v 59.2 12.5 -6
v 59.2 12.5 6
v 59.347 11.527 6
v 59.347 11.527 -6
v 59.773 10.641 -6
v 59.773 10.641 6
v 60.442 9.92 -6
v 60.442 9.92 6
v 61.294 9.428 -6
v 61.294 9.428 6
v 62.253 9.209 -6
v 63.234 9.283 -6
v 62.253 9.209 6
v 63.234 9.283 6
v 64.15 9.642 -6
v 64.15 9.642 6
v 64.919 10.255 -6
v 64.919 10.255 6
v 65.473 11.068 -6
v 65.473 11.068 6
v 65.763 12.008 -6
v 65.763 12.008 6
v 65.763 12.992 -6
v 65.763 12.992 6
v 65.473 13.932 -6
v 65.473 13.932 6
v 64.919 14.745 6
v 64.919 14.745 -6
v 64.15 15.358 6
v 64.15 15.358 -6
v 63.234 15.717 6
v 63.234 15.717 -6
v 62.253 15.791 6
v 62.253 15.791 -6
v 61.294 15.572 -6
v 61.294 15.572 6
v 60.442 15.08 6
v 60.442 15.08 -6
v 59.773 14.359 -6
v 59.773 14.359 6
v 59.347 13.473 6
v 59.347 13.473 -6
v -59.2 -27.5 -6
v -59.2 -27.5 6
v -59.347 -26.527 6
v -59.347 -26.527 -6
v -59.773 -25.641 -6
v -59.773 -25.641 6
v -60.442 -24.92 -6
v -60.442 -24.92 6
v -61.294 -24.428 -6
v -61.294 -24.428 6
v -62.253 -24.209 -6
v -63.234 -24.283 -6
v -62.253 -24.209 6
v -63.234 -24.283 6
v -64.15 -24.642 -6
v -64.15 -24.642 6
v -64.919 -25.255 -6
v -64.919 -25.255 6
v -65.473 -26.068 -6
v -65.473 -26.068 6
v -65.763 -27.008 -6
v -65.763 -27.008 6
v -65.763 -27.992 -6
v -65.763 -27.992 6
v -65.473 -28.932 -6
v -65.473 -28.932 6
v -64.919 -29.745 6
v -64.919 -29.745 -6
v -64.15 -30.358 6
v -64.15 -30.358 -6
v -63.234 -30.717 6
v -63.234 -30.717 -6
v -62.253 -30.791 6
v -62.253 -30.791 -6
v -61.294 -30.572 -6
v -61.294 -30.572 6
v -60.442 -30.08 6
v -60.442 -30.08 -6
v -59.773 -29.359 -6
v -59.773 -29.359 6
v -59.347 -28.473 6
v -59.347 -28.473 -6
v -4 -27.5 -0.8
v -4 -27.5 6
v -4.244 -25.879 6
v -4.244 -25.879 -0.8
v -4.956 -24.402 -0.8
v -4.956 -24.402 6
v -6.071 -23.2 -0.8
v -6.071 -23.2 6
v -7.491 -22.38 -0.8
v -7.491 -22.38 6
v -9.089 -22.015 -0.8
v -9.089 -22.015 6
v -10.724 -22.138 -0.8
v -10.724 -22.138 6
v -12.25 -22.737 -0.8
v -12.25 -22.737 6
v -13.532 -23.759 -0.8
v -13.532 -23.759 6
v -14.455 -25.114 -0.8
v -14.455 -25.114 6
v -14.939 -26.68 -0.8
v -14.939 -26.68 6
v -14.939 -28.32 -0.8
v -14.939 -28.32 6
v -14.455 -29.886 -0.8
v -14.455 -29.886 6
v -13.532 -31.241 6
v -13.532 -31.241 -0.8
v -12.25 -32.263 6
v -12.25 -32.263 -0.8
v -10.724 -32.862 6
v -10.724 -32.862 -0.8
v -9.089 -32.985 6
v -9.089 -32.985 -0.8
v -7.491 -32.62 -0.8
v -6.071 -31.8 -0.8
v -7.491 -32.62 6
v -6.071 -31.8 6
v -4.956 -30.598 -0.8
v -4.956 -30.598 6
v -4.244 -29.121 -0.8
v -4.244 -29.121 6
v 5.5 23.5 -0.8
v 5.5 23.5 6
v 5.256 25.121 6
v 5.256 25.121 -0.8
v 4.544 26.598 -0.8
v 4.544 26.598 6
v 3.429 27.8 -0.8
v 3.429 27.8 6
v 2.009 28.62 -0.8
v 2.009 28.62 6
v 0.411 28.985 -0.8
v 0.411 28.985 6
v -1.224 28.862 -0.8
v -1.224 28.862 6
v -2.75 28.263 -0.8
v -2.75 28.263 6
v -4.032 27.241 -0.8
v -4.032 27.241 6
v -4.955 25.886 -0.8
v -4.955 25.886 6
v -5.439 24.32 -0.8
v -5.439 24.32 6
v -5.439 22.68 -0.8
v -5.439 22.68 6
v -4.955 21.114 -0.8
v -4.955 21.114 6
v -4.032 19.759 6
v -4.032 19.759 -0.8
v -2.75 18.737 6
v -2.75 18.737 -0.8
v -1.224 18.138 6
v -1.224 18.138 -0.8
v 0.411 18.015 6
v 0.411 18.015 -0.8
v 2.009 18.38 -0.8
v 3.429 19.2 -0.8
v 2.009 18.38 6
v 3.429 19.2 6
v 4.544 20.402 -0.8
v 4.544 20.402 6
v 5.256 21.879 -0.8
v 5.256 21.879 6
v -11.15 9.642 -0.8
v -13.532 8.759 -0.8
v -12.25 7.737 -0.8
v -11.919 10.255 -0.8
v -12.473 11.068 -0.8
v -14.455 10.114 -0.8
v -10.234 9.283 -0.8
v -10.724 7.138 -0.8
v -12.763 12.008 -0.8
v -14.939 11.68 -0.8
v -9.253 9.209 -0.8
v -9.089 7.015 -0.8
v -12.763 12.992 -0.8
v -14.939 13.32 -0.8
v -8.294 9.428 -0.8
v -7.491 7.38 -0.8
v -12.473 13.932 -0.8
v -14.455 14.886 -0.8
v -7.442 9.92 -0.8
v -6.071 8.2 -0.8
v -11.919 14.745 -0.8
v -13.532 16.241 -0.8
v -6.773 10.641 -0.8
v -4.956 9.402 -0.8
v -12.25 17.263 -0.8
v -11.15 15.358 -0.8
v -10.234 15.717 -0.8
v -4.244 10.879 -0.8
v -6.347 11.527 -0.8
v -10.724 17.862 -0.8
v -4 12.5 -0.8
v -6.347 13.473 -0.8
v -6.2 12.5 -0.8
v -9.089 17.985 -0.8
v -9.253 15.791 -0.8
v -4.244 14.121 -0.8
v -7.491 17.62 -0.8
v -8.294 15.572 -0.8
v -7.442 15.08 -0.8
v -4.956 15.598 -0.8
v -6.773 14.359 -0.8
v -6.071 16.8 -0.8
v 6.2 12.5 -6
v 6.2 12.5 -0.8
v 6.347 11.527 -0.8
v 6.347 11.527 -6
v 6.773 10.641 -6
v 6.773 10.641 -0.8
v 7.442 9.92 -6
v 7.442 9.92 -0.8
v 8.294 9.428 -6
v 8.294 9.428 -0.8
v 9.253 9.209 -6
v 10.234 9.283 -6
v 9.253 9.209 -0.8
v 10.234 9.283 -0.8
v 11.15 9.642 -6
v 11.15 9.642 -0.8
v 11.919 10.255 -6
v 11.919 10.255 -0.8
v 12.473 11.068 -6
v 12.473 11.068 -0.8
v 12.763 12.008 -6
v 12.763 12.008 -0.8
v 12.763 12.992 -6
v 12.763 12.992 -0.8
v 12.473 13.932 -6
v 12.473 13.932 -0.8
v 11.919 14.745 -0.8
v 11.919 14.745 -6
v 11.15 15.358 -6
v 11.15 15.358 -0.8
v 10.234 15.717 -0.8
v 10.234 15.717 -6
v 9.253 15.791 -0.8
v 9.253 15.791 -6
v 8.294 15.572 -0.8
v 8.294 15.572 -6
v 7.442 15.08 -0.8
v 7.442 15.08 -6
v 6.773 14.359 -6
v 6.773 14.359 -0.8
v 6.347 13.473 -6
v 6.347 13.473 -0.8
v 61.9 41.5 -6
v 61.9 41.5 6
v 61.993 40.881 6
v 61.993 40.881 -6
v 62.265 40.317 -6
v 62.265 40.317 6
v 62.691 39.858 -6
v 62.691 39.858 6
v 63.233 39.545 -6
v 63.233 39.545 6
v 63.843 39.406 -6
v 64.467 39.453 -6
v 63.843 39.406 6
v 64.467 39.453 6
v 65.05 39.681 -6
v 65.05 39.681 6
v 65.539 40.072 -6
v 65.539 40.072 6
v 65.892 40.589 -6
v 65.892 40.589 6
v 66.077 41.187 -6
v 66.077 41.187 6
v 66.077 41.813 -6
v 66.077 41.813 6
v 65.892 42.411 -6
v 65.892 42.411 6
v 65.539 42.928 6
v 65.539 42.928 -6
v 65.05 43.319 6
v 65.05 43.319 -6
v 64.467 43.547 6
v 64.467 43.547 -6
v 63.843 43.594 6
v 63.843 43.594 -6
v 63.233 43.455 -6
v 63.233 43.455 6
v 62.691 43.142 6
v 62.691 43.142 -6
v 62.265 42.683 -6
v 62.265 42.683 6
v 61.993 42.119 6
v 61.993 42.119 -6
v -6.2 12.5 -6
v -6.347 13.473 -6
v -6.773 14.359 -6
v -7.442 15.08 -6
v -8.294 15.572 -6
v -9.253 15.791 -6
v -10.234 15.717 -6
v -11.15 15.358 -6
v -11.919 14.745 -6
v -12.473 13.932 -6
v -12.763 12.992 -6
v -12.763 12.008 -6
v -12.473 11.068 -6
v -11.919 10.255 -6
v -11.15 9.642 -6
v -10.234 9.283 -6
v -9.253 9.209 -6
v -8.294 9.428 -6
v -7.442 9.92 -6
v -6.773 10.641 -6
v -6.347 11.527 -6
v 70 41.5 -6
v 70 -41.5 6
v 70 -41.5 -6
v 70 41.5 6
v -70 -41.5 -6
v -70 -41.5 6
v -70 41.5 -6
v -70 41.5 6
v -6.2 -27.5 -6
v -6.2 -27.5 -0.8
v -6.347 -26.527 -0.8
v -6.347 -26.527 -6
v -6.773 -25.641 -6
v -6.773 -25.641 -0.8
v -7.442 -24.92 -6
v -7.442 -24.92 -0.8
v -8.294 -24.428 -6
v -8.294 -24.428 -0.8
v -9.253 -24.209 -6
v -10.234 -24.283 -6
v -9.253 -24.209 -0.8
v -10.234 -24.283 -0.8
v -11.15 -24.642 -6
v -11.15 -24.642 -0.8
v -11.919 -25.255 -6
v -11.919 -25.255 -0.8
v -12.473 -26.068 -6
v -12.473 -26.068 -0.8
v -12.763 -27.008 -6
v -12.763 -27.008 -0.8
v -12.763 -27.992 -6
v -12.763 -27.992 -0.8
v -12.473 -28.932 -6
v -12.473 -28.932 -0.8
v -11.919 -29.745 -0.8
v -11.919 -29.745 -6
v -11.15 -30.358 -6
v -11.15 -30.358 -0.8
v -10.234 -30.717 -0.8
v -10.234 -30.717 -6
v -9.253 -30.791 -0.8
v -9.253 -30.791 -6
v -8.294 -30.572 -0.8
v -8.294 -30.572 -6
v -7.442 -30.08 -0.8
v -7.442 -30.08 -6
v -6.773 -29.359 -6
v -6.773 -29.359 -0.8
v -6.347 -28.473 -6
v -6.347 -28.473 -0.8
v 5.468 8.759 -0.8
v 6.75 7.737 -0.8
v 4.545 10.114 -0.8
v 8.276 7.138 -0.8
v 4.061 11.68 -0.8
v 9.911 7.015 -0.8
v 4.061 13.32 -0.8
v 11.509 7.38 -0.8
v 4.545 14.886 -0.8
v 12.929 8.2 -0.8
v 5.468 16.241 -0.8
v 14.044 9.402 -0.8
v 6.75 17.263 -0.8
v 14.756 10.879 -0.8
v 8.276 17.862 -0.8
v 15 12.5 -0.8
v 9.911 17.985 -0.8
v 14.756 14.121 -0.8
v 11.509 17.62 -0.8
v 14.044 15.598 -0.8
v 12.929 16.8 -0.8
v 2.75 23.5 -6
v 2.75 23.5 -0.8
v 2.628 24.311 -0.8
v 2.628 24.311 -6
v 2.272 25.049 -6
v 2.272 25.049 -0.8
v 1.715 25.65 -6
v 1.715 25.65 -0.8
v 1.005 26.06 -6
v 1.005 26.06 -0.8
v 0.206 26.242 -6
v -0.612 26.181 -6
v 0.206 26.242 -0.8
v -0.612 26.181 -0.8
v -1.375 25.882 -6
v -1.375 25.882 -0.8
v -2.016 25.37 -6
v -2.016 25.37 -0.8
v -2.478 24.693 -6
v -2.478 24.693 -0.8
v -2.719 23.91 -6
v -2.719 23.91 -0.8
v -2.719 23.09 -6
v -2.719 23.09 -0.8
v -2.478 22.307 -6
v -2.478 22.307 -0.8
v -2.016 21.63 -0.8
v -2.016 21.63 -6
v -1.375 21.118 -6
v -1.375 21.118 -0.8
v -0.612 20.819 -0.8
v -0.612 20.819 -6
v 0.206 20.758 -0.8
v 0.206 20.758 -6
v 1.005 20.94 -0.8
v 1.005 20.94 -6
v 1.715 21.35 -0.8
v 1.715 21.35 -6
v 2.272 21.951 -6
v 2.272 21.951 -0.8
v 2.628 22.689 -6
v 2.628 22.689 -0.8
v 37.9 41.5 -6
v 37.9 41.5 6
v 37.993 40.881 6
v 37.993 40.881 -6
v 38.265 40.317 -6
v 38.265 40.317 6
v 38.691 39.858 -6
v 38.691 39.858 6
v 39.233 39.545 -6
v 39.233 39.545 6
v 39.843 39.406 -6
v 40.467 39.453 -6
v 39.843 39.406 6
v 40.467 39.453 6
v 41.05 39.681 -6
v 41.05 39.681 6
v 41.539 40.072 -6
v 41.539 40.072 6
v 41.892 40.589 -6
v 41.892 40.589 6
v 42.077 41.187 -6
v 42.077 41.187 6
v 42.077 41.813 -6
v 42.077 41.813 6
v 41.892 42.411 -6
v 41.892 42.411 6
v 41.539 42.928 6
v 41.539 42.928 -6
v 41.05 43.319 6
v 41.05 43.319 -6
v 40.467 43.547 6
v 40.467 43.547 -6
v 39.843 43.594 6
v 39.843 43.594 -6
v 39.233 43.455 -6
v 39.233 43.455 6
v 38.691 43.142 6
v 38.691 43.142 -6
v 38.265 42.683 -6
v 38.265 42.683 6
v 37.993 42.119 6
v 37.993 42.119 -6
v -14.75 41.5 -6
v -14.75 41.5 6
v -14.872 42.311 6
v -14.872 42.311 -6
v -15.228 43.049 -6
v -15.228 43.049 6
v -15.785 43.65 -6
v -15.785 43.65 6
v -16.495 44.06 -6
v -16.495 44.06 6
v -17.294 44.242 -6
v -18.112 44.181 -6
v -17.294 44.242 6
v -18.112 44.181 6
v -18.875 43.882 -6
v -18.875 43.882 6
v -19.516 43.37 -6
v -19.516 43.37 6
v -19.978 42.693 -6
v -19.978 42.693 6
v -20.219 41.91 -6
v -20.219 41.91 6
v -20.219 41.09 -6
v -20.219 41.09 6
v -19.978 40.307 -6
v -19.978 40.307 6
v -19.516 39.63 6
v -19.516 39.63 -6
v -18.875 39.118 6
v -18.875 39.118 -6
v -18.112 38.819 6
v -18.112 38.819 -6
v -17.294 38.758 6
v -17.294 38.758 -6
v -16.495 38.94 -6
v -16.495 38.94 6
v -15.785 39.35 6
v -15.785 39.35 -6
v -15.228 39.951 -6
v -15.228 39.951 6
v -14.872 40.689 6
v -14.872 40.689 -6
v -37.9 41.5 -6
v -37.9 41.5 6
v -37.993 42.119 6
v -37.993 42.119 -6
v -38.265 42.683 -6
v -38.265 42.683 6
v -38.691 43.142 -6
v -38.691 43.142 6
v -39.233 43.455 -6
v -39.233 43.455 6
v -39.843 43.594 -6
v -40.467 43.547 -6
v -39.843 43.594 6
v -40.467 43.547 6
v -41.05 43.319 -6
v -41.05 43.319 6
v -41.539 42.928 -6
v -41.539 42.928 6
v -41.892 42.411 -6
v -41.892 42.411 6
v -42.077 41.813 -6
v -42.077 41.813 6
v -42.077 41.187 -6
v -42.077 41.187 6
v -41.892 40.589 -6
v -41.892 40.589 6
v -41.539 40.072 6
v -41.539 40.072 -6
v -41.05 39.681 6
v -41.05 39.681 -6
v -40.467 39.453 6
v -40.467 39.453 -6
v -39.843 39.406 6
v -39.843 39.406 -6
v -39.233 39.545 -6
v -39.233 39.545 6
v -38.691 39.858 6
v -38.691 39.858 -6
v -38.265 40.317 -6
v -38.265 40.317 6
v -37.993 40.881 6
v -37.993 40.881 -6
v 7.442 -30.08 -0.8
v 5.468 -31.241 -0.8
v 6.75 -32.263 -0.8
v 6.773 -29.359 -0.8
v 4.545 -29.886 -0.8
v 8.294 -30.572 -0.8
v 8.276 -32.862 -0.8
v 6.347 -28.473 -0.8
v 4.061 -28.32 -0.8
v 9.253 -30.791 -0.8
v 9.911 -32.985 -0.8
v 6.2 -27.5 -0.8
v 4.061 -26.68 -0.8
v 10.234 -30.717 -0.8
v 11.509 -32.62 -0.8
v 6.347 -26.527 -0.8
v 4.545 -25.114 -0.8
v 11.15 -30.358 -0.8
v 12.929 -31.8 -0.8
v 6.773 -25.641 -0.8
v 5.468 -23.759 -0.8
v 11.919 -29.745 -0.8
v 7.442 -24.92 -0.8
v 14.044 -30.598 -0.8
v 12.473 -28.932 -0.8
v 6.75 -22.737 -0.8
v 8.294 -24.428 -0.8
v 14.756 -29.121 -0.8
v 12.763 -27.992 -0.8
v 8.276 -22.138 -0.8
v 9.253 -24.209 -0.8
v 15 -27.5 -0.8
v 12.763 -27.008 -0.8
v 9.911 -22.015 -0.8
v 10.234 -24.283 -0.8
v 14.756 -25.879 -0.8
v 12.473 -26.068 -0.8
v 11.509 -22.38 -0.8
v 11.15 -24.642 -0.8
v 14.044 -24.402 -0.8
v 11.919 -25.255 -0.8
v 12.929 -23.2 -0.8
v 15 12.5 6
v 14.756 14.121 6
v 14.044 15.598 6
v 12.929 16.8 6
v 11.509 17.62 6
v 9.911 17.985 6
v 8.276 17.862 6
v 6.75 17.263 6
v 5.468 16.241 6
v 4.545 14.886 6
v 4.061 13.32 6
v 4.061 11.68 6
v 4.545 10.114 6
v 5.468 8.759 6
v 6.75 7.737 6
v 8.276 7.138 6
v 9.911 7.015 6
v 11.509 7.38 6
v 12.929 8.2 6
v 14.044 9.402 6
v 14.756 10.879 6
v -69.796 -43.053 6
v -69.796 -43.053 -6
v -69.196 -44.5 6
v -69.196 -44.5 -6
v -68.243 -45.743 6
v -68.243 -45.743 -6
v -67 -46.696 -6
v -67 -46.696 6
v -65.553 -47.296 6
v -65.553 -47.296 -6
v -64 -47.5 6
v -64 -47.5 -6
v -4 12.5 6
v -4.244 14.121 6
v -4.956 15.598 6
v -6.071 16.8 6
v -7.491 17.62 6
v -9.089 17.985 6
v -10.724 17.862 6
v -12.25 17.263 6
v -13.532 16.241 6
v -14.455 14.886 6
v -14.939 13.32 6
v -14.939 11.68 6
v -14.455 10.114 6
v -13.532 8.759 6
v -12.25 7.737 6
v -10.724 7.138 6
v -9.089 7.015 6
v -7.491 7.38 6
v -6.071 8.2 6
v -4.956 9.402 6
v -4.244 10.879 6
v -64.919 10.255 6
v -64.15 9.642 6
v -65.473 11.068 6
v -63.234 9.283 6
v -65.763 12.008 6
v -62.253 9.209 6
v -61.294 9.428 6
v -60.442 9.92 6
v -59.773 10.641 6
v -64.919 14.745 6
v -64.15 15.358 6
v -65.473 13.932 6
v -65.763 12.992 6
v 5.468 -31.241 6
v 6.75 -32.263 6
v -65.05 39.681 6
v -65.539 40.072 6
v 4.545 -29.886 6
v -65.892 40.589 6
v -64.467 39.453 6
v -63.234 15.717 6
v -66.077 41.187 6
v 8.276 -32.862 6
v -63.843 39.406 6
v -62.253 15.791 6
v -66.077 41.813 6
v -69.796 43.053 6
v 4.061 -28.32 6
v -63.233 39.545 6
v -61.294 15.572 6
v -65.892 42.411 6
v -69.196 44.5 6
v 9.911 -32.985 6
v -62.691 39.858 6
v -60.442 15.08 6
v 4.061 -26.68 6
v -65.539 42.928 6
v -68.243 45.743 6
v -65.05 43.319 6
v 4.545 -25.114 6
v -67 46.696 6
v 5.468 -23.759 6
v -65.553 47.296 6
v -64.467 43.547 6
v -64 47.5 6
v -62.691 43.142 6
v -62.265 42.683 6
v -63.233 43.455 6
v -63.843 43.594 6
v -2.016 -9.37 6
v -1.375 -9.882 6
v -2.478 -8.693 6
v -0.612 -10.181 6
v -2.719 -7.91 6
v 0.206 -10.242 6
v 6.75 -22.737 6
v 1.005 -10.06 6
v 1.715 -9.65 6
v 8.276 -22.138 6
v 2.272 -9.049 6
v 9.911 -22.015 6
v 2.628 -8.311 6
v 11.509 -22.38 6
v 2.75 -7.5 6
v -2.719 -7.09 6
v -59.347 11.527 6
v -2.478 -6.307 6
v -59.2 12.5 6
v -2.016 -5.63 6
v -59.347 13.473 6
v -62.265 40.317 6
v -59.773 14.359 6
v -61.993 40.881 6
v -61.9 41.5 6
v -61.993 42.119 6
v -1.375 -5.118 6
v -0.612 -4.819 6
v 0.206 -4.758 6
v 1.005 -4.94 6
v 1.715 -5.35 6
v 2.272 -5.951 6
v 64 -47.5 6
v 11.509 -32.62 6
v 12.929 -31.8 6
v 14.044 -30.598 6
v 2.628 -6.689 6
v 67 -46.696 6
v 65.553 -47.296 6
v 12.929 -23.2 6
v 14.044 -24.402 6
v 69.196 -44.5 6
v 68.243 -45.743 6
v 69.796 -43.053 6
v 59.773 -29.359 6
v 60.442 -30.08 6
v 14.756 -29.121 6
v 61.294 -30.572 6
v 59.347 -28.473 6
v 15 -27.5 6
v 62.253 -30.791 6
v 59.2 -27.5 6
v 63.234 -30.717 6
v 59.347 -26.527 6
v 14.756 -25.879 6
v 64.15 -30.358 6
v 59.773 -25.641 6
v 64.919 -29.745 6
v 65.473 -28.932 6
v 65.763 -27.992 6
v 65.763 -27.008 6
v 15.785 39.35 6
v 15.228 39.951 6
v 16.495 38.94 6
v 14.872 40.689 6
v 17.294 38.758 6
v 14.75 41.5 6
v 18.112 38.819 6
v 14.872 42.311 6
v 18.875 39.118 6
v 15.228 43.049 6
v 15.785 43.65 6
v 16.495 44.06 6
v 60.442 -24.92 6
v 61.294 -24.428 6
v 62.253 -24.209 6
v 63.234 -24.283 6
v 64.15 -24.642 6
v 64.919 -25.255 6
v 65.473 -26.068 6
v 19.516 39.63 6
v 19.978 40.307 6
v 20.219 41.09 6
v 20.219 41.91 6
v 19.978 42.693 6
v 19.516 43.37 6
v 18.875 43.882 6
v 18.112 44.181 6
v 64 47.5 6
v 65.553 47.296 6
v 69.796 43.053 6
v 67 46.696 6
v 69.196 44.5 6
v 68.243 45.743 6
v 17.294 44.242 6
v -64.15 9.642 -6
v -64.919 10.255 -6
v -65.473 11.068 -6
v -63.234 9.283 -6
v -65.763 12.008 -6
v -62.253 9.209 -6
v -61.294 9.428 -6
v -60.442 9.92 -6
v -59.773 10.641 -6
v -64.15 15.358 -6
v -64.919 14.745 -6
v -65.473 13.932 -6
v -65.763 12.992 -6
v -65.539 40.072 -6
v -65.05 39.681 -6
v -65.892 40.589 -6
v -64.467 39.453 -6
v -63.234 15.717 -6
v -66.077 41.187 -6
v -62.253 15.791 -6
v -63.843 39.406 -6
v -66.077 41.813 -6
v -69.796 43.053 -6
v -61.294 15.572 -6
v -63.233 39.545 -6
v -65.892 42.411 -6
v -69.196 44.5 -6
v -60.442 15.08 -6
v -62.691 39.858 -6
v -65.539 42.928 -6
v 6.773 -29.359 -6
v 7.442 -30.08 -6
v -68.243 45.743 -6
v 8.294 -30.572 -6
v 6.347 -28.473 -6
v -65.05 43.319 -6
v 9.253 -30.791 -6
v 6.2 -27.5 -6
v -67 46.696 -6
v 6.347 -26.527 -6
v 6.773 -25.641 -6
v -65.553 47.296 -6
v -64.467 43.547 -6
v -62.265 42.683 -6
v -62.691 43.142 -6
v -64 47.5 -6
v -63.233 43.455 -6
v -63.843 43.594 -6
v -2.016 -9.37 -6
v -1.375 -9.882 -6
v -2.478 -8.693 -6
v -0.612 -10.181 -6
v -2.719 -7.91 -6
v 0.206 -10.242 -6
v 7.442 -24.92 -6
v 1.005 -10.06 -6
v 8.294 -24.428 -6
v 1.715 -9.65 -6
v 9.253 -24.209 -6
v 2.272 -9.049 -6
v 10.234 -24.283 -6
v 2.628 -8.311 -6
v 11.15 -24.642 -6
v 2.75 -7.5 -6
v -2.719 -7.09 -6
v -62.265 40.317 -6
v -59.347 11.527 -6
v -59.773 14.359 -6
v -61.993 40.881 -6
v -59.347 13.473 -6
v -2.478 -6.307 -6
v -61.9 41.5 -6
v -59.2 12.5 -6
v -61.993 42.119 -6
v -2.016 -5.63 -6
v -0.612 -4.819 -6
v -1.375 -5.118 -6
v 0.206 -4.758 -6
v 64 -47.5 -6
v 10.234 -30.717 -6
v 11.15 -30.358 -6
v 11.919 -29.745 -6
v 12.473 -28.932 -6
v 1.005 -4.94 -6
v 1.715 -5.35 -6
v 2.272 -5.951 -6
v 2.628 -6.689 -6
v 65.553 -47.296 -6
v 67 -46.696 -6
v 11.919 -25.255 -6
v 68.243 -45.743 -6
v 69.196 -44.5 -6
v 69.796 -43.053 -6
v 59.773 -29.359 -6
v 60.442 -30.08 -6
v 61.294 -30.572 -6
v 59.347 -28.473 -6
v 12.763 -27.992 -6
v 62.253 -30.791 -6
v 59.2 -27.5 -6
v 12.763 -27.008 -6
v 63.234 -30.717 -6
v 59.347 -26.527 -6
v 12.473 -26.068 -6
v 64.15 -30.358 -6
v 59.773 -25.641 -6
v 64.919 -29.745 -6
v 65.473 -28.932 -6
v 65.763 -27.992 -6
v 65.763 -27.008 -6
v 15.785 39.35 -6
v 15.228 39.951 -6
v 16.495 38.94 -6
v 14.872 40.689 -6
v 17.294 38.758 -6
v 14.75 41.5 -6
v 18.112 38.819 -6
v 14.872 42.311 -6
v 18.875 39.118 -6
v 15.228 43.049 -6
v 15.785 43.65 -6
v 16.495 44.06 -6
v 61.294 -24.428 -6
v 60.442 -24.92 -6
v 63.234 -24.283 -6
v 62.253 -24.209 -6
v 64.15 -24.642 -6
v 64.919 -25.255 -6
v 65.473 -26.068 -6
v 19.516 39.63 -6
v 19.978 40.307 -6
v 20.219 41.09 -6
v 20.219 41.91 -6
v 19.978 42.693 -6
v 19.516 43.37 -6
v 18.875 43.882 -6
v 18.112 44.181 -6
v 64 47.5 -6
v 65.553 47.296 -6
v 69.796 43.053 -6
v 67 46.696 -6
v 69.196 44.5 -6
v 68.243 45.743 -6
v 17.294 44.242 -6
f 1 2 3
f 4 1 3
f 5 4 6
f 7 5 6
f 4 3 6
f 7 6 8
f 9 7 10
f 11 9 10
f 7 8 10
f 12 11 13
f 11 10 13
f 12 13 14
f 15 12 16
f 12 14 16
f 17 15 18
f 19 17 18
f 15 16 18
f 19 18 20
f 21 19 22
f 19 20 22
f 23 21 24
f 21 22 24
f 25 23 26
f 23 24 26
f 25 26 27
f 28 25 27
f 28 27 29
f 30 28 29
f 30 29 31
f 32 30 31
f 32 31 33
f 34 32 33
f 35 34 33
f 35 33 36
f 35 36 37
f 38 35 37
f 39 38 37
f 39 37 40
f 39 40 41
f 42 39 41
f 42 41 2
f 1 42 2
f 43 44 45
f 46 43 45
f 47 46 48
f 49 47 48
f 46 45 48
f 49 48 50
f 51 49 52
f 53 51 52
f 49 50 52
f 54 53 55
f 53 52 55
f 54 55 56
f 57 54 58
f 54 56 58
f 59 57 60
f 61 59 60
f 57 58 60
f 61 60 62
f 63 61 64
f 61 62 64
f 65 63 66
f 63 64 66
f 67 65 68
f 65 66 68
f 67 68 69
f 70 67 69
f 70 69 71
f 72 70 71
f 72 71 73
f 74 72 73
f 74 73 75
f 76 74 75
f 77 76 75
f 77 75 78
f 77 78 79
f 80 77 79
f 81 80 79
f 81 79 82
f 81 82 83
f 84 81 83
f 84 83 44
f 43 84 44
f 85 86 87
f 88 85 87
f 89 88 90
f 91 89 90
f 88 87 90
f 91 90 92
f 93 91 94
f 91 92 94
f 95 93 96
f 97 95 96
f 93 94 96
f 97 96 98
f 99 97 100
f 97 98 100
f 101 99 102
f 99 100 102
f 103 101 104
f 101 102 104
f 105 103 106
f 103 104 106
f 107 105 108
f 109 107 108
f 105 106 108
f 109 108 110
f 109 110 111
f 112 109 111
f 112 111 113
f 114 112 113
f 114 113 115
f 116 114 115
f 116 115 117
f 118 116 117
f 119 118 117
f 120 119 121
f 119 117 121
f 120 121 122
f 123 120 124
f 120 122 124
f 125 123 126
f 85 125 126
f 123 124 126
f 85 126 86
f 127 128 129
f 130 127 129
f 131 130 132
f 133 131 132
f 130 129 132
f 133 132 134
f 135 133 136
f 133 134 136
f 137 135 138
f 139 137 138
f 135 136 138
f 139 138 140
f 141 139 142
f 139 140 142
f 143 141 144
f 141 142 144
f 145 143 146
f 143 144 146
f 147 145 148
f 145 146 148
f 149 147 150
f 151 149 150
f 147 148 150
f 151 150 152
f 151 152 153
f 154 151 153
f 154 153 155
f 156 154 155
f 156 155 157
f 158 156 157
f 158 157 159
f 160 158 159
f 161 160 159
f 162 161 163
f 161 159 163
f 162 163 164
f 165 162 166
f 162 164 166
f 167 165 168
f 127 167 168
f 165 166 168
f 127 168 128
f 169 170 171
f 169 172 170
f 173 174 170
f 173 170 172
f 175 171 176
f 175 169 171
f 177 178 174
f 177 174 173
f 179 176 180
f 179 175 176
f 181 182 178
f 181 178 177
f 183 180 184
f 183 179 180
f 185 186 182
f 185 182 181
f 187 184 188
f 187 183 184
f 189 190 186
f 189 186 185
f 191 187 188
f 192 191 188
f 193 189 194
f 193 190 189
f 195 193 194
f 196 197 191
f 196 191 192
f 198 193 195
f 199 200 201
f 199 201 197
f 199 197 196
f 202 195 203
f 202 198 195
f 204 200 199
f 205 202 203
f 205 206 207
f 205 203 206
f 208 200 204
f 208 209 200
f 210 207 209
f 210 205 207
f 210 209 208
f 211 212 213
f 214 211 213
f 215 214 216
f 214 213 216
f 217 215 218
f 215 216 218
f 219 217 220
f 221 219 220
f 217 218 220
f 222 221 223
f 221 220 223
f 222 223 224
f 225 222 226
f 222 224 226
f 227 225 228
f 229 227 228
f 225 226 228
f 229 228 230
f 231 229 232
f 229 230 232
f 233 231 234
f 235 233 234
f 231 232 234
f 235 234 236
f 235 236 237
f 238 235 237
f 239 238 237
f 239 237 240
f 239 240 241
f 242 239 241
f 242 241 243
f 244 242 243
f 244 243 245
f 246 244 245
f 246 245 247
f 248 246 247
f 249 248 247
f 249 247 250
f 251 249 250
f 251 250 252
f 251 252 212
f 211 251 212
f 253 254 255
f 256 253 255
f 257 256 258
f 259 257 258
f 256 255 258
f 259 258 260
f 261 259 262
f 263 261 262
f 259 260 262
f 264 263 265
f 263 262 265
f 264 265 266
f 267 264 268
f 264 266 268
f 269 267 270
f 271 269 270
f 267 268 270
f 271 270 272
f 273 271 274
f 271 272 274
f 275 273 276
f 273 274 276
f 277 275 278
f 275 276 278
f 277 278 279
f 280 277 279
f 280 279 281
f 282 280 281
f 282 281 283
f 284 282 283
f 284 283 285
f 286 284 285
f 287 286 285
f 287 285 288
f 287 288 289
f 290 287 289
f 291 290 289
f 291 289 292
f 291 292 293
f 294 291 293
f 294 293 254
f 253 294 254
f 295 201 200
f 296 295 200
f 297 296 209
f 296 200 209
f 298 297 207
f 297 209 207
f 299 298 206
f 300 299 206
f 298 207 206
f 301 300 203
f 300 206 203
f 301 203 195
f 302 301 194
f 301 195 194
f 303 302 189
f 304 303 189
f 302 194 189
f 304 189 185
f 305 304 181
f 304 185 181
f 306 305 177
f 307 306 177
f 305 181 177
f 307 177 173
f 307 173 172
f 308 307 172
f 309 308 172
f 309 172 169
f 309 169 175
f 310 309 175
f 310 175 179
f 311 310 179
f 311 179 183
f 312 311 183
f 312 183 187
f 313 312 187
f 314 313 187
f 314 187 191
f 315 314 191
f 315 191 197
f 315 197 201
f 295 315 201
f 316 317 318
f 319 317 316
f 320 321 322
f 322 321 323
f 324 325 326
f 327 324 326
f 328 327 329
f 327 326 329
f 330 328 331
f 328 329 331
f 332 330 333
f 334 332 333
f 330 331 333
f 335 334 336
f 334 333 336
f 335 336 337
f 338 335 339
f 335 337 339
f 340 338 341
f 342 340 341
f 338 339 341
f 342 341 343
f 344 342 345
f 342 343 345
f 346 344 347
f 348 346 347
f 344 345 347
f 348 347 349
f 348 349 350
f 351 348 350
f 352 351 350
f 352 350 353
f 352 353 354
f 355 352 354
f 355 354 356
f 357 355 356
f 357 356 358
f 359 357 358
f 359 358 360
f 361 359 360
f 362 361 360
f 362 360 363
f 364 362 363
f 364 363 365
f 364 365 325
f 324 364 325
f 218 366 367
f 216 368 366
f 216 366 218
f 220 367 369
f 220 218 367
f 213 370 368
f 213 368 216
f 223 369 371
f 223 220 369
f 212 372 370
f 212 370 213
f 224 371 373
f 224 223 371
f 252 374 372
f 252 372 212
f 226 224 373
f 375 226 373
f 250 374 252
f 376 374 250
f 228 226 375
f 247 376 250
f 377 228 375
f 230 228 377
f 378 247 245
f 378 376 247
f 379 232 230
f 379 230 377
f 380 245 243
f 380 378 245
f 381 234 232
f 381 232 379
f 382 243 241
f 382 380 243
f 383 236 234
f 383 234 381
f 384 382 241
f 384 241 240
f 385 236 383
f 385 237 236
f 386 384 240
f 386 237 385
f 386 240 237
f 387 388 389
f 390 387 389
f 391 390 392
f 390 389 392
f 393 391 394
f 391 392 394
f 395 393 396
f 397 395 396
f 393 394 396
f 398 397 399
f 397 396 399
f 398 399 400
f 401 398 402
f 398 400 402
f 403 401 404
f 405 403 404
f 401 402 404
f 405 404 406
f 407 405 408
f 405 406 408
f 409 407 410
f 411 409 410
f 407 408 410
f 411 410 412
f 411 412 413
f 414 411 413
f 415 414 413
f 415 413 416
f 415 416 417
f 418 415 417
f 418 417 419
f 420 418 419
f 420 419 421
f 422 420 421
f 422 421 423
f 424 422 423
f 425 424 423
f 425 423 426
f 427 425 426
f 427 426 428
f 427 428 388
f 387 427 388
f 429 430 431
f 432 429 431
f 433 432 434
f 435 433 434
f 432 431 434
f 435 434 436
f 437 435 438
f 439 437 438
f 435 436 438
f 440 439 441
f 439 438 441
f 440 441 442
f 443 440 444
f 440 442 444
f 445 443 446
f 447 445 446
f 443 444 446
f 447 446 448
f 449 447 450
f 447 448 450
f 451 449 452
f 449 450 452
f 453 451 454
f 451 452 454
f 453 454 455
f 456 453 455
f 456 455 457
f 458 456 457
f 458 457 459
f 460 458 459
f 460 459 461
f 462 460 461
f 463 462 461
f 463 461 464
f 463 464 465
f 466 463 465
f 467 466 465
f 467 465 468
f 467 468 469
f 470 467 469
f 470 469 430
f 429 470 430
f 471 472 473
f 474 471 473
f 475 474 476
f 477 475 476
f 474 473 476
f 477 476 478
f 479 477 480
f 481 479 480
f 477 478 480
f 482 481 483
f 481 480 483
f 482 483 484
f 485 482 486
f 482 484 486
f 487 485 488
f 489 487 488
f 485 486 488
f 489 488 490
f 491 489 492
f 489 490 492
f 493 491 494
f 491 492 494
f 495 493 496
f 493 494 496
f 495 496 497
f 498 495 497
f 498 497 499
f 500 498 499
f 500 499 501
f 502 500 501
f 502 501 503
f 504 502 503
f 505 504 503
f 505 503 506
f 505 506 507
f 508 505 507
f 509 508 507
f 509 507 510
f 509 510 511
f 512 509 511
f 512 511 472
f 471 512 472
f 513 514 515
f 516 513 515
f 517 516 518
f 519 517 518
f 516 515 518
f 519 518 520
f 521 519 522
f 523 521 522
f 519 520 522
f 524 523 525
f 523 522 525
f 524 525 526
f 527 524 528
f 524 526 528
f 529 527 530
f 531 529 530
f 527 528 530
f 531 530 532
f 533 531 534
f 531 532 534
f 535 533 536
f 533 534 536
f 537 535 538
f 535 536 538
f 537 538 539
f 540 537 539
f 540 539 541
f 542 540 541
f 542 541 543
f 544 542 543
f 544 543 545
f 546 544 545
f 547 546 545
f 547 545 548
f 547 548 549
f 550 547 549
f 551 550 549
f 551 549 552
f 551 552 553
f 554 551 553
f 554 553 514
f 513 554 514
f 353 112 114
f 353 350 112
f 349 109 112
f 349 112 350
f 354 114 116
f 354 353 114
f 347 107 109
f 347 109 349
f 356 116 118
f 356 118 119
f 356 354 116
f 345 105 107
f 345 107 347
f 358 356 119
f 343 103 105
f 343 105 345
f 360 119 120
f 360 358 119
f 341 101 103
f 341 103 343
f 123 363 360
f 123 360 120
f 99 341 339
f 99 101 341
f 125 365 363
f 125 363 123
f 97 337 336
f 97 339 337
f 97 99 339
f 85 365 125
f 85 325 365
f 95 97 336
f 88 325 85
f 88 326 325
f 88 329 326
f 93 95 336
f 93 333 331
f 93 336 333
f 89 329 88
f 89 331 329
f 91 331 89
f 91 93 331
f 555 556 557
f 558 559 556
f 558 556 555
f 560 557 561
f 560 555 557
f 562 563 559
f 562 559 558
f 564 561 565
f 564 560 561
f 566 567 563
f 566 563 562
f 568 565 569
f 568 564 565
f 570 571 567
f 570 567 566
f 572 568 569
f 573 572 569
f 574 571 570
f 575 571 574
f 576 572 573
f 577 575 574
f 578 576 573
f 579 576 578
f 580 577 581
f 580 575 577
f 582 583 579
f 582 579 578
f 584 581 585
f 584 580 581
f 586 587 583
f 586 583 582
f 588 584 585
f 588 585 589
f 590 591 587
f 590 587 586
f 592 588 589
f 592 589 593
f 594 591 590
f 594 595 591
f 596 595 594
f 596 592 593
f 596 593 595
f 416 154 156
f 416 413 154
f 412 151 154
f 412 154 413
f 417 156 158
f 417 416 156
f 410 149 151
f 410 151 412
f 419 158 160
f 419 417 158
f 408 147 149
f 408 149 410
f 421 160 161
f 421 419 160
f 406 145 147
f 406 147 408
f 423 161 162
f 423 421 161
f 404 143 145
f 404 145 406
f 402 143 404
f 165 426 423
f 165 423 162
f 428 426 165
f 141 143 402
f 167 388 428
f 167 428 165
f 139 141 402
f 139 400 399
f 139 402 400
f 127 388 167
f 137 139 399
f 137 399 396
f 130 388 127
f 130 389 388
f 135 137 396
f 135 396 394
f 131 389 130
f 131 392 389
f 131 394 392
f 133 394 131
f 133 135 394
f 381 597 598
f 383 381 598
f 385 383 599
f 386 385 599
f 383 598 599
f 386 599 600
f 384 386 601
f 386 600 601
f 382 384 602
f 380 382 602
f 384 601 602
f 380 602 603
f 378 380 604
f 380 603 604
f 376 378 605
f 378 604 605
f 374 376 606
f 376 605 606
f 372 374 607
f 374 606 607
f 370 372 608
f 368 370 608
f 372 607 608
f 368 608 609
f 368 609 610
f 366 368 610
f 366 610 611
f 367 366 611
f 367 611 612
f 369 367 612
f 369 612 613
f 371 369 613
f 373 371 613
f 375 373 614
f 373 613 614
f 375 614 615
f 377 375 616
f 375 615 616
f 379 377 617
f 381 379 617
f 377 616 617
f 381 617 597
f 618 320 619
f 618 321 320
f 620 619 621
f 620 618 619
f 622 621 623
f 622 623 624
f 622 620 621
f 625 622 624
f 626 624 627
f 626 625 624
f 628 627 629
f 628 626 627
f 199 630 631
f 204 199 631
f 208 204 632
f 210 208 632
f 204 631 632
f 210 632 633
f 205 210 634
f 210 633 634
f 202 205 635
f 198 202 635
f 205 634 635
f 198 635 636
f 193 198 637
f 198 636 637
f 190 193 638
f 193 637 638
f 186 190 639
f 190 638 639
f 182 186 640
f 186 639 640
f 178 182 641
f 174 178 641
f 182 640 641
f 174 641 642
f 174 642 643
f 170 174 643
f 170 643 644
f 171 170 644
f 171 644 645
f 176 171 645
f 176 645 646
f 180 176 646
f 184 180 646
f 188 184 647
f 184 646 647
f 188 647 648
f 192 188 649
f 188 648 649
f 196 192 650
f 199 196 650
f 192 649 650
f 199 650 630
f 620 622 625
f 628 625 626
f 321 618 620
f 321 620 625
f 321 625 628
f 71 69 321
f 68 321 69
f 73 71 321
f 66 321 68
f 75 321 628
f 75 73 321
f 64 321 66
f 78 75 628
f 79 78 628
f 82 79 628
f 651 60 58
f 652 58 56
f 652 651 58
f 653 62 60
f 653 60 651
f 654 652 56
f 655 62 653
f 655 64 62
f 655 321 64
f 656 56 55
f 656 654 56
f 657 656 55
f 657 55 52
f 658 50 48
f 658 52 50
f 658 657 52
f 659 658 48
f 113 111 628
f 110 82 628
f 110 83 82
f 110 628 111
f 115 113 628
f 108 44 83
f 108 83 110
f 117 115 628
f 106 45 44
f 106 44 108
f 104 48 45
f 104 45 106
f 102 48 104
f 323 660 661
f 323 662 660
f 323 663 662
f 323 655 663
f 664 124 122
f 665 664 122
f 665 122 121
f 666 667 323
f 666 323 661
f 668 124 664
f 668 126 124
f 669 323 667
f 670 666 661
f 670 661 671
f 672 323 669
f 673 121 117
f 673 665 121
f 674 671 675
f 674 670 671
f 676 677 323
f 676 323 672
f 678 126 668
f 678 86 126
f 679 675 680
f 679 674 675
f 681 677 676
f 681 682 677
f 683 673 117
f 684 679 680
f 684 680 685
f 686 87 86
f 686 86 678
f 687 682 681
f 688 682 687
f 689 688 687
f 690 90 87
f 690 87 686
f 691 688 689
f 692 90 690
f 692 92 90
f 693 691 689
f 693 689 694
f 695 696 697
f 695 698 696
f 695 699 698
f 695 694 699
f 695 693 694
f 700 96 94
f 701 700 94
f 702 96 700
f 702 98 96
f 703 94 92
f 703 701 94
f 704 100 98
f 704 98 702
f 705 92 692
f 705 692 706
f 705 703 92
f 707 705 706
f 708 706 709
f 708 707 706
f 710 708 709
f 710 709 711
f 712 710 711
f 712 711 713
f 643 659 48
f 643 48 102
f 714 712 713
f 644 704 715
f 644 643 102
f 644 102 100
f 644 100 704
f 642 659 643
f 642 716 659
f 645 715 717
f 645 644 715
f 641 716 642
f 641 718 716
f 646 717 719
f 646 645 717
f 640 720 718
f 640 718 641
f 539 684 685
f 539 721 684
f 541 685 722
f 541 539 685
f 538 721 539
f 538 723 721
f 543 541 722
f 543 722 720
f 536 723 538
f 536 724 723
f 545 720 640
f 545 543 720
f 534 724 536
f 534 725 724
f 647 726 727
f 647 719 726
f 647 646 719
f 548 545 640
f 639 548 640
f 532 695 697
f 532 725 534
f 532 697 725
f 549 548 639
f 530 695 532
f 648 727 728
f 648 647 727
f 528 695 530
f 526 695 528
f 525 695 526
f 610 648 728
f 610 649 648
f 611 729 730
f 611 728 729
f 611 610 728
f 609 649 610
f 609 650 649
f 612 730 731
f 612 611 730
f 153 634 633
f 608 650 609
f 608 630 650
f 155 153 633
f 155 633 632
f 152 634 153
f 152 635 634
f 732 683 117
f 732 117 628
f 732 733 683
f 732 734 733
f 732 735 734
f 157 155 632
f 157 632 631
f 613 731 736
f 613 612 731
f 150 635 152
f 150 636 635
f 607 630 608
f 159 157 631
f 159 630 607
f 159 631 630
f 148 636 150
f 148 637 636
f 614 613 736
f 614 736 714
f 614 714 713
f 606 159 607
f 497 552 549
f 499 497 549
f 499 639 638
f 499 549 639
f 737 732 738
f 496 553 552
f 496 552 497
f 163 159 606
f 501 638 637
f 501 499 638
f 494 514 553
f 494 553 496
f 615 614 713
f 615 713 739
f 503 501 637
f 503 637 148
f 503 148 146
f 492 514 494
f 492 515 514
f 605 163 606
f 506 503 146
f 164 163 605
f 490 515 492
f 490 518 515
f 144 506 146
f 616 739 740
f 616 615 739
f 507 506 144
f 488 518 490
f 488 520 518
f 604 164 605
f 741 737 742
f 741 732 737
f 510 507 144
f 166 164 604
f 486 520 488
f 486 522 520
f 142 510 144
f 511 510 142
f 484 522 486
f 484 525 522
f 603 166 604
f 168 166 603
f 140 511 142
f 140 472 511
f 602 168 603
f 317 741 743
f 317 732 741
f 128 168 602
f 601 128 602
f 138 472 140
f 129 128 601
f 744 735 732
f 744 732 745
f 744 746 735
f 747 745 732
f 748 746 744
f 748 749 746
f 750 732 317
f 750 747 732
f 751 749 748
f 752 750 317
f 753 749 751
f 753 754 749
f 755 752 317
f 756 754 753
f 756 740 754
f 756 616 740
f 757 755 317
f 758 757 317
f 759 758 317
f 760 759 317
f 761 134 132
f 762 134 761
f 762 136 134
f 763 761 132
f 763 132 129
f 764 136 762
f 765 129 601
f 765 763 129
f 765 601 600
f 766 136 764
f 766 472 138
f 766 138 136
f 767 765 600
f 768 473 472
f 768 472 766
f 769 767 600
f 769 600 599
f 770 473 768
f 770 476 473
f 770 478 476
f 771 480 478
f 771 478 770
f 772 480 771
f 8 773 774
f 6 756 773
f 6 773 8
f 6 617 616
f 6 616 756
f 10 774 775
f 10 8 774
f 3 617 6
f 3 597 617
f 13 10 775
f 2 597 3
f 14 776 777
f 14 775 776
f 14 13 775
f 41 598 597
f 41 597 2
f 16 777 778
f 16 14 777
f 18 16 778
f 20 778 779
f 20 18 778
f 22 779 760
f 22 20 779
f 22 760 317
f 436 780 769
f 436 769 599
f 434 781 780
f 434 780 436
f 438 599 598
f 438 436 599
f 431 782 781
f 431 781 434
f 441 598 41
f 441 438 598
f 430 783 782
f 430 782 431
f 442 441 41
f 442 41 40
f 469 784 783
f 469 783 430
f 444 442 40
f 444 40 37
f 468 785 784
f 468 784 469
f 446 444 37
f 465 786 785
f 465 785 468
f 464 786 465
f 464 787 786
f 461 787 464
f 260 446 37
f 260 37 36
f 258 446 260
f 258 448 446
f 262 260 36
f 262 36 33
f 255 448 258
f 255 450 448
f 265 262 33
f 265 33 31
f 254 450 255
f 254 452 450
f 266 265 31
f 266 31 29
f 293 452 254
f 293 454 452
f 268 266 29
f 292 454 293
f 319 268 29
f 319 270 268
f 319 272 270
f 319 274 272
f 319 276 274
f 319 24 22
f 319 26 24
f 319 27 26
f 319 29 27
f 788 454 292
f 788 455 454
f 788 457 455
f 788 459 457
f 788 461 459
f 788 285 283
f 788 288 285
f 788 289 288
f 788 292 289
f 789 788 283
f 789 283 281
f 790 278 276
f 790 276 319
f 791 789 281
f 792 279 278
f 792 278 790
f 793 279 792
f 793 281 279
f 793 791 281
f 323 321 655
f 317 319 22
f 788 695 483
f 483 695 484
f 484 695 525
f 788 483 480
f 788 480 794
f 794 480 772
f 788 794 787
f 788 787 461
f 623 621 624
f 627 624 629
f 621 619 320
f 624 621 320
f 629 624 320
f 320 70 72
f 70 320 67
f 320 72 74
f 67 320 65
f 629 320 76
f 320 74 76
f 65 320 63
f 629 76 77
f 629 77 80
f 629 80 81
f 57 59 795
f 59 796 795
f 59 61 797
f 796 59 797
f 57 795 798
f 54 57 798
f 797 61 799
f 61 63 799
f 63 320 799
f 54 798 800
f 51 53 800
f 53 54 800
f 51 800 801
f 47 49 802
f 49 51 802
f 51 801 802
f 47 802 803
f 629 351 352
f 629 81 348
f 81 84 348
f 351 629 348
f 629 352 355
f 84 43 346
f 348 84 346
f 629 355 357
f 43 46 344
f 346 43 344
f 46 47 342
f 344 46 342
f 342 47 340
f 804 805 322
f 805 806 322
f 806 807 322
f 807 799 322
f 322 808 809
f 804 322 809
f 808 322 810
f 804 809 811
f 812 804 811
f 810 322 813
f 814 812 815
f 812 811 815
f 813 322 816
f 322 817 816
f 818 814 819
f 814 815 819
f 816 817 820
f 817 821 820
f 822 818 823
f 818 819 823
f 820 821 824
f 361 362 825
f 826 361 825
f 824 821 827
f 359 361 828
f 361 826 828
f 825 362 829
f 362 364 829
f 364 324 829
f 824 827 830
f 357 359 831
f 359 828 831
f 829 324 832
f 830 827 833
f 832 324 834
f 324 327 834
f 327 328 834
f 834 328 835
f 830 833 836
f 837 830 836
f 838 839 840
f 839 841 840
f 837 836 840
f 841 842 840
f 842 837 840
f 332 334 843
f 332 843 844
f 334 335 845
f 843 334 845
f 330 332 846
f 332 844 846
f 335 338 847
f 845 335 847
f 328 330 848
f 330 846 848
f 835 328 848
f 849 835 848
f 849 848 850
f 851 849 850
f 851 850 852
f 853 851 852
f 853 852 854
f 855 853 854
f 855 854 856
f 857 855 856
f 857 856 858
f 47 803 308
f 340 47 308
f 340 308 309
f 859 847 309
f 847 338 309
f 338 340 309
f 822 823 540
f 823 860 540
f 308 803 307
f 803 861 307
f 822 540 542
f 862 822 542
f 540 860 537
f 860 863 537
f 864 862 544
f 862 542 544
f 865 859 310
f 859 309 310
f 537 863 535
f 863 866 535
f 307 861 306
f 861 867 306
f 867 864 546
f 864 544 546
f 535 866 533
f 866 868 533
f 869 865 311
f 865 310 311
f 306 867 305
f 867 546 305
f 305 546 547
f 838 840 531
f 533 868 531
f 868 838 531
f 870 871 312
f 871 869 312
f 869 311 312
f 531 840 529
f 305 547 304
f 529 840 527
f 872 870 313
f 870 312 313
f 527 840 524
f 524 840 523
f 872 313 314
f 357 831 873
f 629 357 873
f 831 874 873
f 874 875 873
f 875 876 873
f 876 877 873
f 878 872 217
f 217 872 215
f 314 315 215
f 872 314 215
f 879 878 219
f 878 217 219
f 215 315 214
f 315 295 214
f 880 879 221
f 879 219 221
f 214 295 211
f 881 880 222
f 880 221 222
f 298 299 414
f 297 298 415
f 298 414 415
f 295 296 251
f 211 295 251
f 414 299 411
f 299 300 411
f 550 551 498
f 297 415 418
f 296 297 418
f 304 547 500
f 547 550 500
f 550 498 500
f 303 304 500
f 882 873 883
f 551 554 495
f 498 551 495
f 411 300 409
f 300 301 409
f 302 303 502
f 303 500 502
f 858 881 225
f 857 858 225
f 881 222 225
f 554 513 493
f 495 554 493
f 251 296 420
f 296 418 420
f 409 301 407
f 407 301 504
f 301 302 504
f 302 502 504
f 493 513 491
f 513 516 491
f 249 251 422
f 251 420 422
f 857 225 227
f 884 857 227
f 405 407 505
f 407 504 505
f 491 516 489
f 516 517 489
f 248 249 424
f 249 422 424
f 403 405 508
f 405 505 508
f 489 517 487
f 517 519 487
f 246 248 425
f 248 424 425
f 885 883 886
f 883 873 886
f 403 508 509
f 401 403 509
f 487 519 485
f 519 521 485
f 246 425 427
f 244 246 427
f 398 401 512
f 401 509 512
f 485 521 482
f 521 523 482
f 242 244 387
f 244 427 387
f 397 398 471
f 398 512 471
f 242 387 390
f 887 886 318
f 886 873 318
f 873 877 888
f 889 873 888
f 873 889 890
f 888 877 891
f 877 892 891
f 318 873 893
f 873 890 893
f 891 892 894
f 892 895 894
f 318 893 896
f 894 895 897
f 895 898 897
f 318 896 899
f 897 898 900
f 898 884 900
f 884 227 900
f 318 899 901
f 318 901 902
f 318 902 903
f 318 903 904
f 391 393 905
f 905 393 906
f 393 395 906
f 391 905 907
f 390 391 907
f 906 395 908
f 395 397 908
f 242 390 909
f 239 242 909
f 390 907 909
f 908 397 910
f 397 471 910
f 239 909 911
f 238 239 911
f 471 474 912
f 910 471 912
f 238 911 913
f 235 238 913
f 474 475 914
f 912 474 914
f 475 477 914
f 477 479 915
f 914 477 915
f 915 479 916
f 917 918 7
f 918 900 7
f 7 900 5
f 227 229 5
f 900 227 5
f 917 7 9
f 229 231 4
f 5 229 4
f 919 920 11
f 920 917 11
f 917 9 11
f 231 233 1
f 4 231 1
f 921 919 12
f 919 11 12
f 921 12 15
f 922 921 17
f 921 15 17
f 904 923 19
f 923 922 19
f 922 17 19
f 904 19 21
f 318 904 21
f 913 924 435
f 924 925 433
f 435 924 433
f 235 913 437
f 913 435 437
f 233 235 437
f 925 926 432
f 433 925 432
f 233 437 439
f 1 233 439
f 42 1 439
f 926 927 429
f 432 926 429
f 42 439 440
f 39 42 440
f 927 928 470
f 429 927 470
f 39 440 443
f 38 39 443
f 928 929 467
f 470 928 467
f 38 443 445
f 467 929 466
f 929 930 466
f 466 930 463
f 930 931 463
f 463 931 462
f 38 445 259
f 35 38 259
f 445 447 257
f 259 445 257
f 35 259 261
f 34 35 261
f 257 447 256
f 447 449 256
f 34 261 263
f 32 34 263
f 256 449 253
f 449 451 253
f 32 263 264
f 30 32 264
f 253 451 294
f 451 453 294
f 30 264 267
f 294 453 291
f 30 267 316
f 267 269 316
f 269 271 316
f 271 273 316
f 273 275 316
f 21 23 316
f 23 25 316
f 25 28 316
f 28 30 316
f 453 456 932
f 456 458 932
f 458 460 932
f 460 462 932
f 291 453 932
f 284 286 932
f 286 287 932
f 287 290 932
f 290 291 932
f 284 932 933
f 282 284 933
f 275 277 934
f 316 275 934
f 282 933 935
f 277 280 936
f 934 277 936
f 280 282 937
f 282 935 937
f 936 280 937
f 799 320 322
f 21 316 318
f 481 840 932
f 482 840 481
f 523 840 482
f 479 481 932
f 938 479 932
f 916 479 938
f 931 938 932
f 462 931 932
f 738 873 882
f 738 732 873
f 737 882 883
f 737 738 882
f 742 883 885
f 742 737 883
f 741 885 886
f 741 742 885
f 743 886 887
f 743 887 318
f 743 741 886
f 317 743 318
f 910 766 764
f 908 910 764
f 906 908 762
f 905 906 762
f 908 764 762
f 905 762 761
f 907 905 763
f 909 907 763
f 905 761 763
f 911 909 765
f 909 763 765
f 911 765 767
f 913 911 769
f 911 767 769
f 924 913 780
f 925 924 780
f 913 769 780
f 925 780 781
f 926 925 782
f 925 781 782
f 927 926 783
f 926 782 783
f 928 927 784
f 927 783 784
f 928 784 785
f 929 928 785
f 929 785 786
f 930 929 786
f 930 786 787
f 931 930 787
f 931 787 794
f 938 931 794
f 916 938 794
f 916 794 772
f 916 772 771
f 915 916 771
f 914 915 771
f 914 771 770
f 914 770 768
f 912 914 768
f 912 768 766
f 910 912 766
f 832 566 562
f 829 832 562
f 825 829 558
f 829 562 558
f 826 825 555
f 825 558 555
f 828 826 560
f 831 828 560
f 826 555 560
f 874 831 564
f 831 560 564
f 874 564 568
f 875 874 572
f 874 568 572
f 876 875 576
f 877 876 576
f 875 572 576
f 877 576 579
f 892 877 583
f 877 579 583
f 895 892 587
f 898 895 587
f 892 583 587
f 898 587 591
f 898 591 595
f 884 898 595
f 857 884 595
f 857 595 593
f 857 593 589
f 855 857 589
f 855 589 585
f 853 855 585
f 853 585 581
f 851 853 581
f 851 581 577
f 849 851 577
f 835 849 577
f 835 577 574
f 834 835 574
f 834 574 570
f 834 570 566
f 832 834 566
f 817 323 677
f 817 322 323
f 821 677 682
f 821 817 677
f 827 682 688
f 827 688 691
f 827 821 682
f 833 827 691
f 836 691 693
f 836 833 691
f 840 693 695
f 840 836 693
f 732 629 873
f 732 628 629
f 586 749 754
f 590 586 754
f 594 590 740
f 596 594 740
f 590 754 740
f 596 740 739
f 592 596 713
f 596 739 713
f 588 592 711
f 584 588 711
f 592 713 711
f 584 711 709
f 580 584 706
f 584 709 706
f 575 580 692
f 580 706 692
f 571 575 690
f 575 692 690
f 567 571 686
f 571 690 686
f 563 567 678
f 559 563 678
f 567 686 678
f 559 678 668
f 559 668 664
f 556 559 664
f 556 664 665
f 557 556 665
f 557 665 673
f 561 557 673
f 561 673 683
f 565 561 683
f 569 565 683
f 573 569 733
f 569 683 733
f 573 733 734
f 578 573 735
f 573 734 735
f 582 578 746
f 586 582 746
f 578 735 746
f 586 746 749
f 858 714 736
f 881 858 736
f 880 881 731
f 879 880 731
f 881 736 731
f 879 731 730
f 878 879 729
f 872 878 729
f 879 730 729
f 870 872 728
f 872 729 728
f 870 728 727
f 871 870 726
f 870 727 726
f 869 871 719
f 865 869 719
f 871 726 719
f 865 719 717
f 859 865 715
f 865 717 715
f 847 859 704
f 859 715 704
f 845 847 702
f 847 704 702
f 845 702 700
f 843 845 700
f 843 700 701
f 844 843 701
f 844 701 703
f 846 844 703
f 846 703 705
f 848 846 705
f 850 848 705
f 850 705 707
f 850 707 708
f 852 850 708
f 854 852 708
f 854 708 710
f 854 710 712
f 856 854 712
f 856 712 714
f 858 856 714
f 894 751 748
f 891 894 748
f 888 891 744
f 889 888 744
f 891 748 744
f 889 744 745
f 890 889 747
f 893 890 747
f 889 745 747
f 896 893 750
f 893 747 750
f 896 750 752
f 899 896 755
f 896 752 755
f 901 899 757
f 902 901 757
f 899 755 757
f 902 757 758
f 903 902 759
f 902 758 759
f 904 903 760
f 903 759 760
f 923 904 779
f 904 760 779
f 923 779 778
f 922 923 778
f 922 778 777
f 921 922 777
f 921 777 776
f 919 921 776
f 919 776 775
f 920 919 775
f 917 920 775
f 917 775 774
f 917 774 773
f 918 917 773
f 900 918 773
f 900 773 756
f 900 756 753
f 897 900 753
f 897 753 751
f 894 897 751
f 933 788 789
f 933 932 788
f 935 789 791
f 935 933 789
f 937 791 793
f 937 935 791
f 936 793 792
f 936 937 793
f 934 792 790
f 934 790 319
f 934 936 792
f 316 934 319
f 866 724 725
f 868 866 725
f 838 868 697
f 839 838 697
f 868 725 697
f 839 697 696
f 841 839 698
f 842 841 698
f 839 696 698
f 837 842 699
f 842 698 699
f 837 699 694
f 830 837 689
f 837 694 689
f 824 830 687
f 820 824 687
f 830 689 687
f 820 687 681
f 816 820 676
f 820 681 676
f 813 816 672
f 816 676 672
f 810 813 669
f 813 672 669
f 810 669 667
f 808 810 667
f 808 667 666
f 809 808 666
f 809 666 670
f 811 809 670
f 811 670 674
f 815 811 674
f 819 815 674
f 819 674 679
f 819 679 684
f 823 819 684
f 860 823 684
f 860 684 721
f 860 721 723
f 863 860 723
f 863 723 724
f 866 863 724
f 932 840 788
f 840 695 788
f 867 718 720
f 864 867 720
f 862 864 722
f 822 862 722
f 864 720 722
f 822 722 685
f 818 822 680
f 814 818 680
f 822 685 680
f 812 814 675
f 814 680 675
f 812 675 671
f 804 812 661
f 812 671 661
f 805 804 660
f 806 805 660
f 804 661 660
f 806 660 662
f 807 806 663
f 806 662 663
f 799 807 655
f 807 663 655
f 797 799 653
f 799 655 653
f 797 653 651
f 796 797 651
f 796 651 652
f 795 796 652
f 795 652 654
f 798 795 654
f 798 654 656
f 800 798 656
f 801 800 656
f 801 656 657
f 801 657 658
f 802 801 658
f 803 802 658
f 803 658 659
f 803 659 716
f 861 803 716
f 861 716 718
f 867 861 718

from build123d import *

# Parameters (mm, degrees)
SKETCH1_W           = 140
SKETCH1_H           = 95
BOSS_EXTRUDE1_DEPTH = 6
SKETCH2_R           = 2.75
SKETCH2_R_2         = 3.3
SKETCH2_R_3         = 2.1
CUT_EXTRUDE1_DEPTH  = 86.441500455
SKETCH3_R           = 5.5
CUT_EXTRUDE2_DEPTH  = 6.8
FILLET1_R           = 6


with BuildPart() as part:
    # Sketch1 → Boss-Extrude1 (new, symmetric)
    with BuildSketch(Plane.XY):
        Rectangle(SKETCH1_W, SKETCH1_H)
    extrude(amount=BOSS_EXTRUDE1_DEPTH, both=True)

    # Sketch2 → Cut-Extrude1 (cut, through all)
    with BuildSketch(Plane.XY.offset(6)):
        with Locations((0, 23.5)):
            Circle(SKETCH2_R)
        with Locations((0, -7.5)):
            Circle(SKETCH2_R)
        with Locations((-9.5, 12.5)):
            Circle(SKETCH2_R_2)
        with Locations((-9.5, -27.5)):
            Circle(SKETCH2_R_2)
        with Locations((-17.5, 41.5)):
            Circle(SKETCH2_R)
        with Locations((-40, 41.5)):
            Circle(SKETCH2_R_3)
        with Locations((-64, 41.5)):
            Circle(SKETCH2_R_3)
        with Locations((-62.5, 12.5)):
            Circle(SKETCH2_R_2)
        with Locations((-62.5, -27.5)):
            Circle(SKETCH2_R_2)
        with Locations(Location((62.5, -27.5, 0), (0, 0, 180))):
            Circle(SKETCH2_R_2)
        with Locations(Location((62.5, 12.5, 0), (0, 0, 180))):
            Circle(SKETCH2_R_2)
        with Locations(Location((64, 41.5, 0), (0, 0, 180))):
            Circle(SKETCH2_R_3)
        with Locations(Location((40, 41.5, 0), (0, 0, 180))):
            Circle(SKETCH2_R_3)
        with Locations(Location((17.5, 41.5, 0), (0, 0, 180))):
            Circle(SKETCH2_R)
        with Locations(Location((9.5, -27.5, 0), (0, 0, 180))):
            Circle(SKETCH2_R_2)
        with Locations(Location((9.5, 12.5, 0), (0, 0, 180))):
            Circle(SKETCH2_R_2)
    extrude(amount=-CUT_EXTRUDE1_DEPTH, mode=Mode.SUBTRACT)

    # Sketch3 → Cut-Extrude2 (cut)
    with BuildSketch(Plane.XY.offset(6)):
        with Locations((-9.5, -27.5)):
            Circle(SKETCH3_R)
        with Locations((9.5, -27.5)):
            Circle(SKETCH3_R)
        with Locations((9.5, 12.5)):
            Circle(SKETCH3_R)
        with Locations((0, 23.5)):
            Circle(SKETCH3_R)
        with Locations((-9.5, 12.5)):
            Circle(SKETCH3_R)
    extrude(amount=-CUT_EXTRUDE2_DEPTH, mode=Mode.SUBTRACT)

    # Fillet1
    fillet1_edges = [part.edges().sort_by_distance(p)[0] for p in [
        (-70, 47.5, 0),
        (70, 47.5, 0),
        (70, -47.5, 0),
        (-70, -47.5, 0),
    ]]
    fillet(fillet1_edges, radius=FILLET1_R)


solid = part.part
